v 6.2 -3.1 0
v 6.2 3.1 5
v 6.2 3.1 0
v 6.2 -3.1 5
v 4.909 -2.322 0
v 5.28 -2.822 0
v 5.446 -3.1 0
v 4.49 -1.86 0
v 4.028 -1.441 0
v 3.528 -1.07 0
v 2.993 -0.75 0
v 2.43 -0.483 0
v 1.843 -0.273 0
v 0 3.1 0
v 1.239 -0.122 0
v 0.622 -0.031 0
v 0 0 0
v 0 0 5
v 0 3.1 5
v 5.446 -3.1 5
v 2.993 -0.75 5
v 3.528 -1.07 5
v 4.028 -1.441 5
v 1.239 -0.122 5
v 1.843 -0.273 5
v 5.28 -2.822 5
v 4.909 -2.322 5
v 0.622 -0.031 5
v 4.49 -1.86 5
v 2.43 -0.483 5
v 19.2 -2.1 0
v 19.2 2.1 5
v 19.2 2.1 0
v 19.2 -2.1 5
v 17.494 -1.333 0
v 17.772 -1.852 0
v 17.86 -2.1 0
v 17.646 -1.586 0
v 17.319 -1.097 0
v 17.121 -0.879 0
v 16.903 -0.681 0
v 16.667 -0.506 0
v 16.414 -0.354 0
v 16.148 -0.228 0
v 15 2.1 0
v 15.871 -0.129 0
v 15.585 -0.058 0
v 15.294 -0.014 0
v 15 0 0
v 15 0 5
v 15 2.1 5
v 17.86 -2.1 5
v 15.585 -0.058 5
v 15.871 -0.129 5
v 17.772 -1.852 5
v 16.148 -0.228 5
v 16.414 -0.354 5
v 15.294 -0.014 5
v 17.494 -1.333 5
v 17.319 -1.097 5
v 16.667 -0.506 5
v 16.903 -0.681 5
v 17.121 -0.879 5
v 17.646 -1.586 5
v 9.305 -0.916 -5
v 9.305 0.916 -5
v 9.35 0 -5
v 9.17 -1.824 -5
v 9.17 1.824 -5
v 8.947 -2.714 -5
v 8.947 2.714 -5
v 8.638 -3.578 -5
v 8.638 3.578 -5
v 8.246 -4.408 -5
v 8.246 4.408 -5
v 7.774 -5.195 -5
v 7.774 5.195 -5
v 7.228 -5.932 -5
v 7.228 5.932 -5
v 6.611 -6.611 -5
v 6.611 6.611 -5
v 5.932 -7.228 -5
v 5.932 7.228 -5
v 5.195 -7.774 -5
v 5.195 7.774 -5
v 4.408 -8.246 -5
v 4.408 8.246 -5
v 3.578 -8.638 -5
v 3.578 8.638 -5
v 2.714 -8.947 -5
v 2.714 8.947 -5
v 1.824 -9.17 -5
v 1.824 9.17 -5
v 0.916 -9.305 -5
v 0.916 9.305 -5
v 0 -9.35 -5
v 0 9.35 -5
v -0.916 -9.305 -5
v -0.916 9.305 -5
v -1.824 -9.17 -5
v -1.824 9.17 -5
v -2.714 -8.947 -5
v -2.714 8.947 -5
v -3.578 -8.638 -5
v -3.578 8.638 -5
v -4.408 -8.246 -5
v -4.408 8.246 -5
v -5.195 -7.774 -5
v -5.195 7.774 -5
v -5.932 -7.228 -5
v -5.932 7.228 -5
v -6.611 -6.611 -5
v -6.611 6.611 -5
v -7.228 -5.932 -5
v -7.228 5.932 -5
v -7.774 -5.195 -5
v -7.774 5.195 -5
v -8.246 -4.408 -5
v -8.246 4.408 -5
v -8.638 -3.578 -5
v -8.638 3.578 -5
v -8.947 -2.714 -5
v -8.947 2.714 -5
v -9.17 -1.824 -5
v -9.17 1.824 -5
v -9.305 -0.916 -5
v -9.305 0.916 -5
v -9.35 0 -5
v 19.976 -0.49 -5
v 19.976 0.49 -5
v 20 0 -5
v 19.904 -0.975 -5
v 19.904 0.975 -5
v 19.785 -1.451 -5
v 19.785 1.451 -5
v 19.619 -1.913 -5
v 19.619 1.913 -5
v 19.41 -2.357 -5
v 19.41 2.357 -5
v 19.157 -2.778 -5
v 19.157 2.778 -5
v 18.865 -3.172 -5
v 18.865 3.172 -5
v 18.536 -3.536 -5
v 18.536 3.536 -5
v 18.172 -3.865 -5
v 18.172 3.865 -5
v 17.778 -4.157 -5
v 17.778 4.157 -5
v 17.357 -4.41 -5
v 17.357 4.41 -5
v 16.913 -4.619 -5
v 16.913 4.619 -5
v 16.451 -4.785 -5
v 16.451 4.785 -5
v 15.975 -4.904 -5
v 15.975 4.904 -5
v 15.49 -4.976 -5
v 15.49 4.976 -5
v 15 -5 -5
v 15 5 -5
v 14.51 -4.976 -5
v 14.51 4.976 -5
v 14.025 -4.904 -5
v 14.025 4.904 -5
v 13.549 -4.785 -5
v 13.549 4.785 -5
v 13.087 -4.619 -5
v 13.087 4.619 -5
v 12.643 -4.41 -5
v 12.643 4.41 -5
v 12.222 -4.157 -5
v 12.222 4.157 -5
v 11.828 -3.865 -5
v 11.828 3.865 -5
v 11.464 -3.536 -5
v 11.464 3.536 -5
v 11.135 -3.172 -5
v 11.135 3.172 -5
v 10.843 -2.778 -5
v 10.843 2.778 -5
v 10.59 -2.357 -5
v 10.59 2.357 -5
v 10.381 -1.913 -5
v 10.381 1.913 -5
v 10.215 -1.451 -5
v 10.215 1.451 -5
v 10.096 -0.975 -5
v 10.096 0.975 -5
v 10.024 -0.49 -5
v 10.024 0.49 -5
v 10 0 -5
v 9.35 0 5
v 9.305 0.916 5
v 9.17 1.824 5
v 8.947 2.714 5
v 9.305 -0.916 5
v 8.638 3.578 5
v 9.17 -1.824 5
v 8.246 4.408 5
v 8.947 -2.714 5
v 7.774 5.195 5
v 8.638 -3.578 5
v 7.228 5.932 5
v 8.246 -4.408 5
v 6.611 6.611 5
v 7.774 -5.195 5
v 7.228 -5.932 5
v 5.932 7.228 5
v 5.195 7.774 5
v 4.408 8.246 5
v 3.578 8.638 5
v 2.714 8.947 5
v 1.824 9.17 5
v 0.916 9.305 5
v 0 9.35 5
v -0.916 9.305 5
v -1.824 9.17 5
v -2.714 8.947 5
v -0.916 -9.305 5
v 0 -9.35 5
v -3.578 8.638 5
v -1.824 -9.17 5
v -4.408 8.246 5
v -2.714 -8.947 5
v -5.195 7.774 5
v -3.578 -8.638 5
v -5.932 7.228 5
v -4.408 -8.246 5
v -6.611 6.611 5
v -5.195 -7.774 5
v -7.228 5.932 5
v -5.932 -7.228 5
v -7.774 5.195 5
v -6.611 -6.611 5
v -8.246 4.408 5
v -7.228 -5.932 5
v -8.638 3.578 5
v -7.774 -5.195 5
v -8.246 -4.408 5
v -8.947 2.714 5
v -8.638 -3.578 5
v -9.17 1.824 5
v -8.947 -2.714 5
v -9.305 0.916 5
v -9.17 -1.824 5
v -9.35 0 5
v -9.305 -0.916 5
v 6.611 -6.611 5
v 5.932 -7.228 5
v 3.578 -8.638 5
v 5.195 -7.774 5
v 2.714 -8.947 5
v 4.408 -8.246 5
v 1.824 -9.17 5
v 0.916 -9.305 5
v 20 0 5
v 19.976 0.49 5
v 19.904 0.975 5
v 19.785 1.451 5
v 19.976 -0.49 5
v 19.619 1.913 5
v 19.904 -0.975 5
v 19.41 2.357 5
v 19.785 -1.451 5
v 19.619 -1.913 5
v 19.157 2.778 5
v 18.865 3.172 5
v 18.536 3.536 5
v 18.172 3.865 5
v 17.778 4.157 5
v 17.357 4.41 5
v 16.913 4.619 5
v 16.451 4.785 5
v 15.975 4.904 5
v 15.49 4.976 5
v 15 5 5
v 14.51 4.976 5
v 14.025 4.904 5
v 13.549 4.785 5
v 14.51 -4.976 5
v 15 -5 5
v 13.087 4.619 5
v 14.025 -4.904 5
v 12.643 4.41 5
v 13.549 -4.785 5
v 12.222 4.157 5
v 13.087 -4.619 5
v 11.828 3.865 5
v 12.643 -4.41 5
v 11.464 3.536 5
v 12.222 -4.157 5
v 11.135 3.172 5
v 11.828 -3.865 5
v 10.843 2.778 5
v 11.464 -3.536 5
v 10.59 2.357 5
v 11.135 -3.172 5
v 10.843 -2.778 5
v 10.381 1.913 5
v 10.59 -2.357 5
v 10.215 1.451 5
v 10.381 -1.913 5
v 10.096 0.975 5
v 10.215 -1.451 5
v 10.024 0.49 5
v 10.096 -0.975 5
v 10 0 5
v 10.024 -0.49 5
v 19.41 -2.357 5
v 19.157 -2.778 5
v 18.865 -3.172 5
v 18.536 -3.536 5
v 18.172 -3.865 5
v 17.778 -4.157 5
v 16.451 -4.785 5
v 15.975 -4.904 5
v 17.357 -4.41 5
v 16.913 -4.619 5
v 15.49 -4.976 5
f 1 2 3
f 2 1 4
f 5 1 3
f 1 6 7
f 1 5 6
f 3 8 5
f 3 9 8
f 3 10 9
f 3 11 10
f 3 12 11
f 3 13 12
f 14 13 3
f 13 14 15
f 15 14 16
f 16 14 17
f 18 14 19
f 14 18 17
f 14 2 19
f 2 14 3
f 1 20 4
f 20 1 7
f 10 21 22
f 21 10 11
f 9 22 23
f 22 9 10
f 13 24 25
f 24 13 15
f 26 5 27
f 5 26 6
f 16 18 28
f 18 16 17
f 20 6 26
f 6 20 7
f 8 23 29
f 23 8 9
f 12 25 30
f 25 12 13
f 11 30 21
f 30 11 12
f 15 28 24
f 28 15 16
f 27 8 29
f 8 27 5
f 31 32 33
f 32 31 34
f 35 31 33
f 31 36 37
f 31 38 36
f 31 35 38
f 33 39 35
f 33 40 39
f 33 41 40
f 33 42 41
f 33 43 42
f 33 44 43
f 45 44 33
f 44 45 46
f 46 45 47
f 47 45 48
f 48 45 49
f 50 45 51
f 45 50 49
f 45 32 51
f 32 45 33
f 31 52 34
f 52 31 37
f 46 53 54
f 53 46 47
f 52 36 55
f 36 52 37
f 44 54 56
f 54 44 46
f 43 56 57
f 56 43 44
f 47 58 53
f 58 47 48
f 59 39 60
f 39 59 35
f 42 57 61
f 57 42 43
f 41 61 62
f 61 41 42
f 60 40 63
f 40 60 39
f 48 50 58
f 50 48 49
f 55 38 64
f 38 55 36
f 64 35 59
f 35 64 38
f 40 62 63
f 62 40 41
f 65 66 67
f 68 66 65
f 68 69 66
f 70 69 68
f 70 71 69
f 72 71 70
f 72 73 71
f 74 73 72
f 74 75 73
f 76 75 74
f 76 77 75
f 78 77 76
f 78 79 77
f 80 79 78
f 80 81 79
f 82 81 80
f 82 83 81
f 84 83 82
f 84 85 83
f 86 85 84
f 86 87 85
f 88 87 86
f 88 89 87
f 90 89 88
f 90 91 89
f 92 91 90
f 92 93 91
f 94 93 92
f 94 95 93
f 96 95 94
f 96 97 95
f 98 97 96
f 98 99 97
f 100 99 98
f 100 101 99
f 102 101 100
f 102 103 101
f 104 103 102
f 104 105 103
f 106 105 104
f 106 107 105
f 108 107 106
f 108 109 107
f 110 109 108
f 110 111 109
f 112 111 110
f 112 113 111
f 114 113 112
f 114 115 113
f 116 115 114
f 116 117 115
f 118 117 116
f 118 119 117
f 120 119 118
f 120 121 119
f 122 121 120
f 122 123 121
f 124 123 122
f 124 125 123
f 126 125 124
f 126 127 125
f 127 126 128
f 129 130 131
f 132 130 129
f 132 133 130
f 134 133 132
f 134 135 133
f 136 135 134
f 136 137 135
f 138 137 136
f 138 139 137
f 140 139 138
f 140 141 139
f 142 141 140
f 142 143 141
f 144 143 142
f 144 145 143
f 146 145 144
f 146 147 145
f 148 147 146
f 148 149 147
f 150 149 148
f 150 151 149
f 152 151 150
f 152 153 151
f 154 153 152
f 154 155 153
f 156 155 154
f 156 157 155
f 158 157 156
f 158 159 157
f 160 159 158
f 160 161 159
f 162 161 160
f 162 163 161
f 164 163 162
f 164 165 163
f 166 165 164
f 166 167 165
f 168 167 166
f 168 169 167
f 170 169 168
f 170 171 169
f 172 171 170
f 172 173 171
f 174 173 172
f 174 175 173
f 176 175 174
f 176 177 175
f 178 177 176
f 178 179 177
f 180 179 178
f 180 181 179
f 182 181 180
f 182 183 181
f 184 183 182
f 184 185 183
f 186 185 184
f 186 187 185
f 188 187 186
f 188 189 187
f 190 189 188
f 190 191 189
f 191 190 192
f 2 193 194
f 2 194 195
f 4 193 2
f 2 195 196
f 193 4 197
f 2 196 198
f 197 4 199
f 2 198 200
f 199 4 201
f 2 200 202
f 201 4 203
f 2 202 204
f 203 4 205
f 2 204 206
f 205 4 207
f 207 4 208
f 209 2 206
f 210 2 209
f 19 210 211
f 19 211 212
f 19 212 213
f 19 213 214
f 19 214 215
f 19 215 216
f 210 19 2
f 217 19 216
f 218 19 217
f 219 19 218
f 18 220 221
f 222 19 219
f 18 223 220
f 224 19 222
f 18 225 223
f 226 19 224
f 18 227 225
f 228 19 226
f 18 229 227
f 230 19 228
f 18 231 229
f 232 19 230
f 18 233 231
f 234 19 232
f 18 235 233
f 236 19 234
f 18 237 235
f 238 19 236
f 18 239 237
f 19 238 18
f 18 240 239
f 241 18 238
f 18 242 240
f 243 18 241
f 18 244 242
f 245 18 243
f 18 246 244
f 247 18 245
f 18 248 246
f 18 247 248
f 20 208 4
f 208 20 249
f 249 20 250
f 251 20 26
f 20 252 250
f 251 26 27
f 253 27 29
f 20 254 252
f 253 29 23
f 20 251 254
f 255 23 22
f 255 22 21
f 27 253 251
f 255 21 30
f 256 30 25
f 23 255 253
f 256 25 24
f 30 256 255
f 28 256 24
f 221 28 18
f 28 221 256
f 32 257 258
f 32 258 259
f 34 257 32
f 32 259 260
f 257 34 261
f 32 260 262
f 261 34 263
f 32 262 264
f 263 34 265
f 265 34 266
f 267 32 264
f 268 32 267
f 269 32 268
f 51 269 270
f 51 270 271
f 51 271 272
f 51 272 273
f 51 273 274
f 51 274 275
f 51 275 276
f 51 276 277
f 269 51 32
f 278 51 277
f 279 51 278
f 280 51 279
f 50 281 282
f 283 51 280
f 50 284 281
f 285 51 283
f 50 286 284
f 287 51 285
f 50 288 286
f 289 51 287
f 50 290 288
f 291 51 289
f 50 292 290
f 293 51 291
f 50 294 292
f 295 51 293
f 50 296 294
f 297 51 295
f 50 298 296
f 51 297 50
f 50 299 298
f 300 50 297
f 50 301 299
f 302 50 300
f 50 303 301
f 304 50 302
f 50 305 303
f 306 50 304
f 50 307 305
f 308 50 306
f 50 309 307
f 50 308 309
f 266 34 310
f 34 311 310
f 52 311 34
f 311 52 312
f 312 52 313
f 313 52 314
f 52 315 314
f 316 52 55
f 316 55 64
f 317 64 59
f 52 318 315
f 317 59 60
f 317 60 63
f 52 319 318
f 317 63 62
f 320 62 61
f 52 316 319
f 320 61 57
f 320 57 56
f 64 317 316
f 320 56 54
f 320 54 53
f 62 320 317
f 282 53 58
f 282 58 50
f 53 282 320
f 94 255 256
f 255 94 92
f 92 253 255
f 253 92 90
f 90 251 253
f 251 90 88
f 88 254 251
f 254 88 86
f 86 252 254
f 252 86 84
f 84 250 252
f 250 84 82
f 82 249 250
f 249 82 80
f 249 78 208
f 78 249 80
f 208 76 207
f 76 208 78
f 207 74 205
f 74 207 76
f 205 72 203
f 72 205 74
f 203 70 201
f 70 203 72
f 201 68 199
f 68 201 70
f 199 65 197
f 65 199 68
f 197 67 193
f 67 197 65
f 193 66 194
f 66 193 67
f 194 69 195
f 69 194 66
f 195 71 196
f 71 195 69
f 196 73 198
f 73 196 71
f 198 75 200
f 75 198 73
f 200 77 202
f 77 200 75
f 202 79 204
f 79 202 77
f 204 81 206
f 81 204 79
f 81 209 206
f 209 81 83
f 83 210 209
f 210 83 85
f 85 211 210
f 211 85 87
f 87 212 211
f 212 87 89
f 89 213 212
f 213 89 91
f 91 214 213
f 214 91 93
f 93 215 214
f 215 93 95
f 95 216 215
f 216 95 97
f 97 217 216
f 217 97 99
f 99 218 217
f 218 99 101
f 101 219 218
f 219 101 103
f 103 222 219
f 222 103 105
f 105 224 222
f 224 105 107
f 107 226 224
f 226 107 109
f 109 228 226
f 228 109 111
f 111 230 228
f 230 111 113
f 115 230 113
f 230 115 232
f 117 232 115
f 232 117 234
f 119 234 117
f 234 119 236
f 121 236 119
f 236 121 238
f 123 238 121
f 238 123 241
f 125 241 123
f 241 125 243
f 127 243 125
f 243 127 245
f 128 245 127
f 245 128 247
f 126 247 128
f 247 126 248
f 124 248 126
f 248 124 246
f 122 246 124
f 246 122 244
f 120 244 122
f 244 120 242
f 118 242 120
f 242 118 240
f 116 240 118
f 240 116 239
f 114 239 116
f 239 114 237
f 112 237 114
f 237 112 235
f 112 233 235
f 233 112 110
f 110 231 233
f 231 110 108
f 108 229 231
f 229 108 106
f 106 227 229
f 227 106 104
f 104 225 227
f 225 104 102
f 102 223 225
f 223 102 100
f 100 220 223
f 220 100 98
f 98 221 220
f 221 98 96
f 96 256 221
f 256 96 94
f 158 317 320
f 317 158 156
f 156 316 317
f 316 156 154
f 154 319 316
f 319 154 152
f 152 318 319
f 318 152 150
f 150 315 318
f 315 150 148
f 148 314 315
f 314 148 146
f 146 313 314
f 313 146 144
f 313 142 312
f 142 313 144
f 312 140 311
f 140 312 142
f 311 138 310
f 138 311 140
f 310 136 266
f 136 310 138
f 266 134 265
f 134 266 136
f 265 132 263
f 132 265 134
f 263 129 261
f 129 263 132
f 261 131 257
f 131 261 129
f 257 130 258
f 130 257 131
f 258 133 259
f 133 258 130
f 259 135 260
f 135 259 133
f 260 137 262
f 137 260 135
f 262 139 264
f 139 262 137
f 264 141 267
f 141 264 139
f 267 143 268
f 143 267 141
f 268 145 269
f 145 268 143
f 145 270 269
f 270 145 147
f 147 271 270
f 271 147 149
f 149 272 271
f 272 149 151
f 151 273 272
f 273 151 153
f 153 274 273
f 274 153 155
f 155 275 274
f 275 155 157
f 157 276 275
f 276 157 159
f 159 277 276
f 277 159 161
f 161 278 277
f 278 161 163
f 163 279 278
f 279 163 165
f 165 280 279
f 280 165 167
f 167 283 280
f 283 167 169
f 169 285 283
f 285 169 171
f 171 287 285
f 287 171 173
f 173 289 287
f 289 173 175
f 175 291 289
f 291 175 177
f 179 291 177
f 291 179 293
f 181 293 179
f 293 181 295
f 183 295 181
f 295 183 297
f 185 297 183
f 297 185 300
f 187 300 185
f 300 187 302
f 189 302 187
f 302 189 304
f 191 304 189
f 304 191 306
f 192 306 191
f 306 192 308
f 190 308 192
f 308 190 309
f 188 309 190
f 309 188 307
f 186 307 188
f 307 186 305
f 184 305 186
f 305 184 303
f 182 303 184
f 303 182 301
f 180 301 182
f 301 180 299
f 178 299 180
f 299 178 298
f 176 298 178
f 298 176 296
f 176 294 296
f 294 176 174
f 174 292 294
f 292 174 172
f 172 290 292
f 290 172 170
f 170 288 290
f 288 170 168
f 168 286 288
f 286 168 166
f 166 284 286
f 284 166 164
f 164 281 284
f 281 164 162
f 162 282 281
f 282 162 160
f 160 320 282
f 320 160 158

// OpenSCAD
$fn = 128; // High resolution for smooth curves and accurate hole sizes

// --- Dimensions (mm) ---
// Rod Stand Dimensions
ROD_DIAMETER = 12.7;
ROD_WALL_THICKNESS = 3;
ROD_OUTER_DIAMETER = ROD_DIAMETER + 2 * ROD_WALL_THICKNESS; // 18.7

// Tubing Dimensions
TUBING_DIAMETER = 6;
TUBING_WALL_THICKNESS = 2;
TUBING_OUTER_DIAMETER = TUBING_DIAMETER + 2 * TUBING_WALL_THICKNESS; // 10

// Positioning
RING_ROD_X = 0;
RING_TUBING_X = 15;

// Bridge Dimensions
BRIDGE_WIDTH_X = 4; // From x=8 to x=12
BRIDGE_WIDTH_Y = 6;

// Cutout Dimensions
CUTOUT_ROD_WIDTH = 10;
CUTOUT_ROD_Y_LIMIT = 5; // -5 < y < 5

CUTOUT_TUBING_WIDTH = 4.5;
CUTOUT_TUBING_Y_LIMIT = 2.25; // -2.25 < y < 2.25

// Extrusion Height
EXTRUSION_HEIGHT = 10;

// --- Generation ---

difference() {
    // 1. The Main Profile (Extruded)
    linear_extrude(height = EXTRUSION_HEIGHT, center = true) {
        union() {
            // --- Ring for Rod Stand ---
            circle(
                r = ROD_OUTER_DIAMETER / 2,
                $fn = 64
            );
            
            // Cutout for Rod Stand (-X side)
            // Remove everything with x < 0 and -5 < y < 5
            difference() {
                // Create a bounding box for the cutout logic
                // We use a large box that covers the cutout area to subtract from the ring
                // To ensure clean subtraction, we extend slightly past the limits
                translate([0, -CUTOUT_ROD_Y_LIMIT - 0.1, 0]) 
                    cube([CUTOUT_ROD_WIDTH + 0.1, CUTOUT_ROD_Y_LIMIT * 2 + 0.2, 1]);
            }
            
            // --- Ring for Tubing ---
            translate([RING_TUBING_X, 0, 0]) {
                circle(
                    r = TUBING_OUTER_DIAMETER / 2,
                    $fn = 64
                );
                
                // Cutout for Tubing (+X side)
                // Remove everything with x > 15 and -2.25 < y < 2.25
                difference() {
                    translate([RING_TUBING_X, -CUTOUT_TUBING_Y_LIMIT - 0.1, 0]) 
                        cube([CUTOUT_TUBING_WIDTH + 0.1, CUTOUT_TUBING_Y_LIMIT * 2 + 0.2, 1]);
                }
            }
            
            // --- Solid Bridge ---
            // Joins x=8 to x=12, width 6mm in Y
            translate([8, -BRIDGE_WIDTH_Y / 2, 0]) 
                cube([BRIDGE_WIDTH_X, BRIDGE_WIDTH_Y, 1]);
        }
    }
    
    // 2. Cutouts for the Holes (Difference shapes)
    // We subtract the inner voids of the rings to create the holes.
    // Extend slightly past the inner diameter to ensure clean walls.
    
    // Hole for Rod Stand
    translate([RING_ROD_X, 0, 0]) {
        difference() {
            // Outer shape of the hole (slightly larger than inner diameter to cut through)
            translate([0, -ROD_WALL_THICKNESS - 0.1, 0]) 
                cube([ROD_WALL_THICKNESS * 2 + 0.2, ROD_WALL_THICKNESS * 2 + 0.2, EXTRUSION_HEIGHT + 0.1]);
            
            // Inner void (negative space)
            translate([0, -ROD_DIAMETER / 2, 0]) 
                cylinder(h = EXTRUSION_HEIGHT + 0.1, r = ROD_DIAMETER / 2, $fn = 64);
        }
    }
    
    // Hole for Tubing
    translate([RING_TUBING_X, 0, 0]) {
        difference() {
            // Outer shape of the hole
            translate([0, -TUBING_WALL_THICKNESS - 0.1, 0]) 
                cube([TUBING_WALL_THICKNESS * 2 + 0.2, TUBING_WALL_THICKNESS * 2 + 0.2, EXTRUSION_HEIGHT + 0.1]);
            
            // Inner void (negative space)
            translate([0, -TUBING_DIAMETER / 2, 0]) 
                cylinder(h = EXTRUSION_HEIGHT + 0.1, r = TUBING_DIAMETER / 2, $fn = 64);
        }
    }
}
